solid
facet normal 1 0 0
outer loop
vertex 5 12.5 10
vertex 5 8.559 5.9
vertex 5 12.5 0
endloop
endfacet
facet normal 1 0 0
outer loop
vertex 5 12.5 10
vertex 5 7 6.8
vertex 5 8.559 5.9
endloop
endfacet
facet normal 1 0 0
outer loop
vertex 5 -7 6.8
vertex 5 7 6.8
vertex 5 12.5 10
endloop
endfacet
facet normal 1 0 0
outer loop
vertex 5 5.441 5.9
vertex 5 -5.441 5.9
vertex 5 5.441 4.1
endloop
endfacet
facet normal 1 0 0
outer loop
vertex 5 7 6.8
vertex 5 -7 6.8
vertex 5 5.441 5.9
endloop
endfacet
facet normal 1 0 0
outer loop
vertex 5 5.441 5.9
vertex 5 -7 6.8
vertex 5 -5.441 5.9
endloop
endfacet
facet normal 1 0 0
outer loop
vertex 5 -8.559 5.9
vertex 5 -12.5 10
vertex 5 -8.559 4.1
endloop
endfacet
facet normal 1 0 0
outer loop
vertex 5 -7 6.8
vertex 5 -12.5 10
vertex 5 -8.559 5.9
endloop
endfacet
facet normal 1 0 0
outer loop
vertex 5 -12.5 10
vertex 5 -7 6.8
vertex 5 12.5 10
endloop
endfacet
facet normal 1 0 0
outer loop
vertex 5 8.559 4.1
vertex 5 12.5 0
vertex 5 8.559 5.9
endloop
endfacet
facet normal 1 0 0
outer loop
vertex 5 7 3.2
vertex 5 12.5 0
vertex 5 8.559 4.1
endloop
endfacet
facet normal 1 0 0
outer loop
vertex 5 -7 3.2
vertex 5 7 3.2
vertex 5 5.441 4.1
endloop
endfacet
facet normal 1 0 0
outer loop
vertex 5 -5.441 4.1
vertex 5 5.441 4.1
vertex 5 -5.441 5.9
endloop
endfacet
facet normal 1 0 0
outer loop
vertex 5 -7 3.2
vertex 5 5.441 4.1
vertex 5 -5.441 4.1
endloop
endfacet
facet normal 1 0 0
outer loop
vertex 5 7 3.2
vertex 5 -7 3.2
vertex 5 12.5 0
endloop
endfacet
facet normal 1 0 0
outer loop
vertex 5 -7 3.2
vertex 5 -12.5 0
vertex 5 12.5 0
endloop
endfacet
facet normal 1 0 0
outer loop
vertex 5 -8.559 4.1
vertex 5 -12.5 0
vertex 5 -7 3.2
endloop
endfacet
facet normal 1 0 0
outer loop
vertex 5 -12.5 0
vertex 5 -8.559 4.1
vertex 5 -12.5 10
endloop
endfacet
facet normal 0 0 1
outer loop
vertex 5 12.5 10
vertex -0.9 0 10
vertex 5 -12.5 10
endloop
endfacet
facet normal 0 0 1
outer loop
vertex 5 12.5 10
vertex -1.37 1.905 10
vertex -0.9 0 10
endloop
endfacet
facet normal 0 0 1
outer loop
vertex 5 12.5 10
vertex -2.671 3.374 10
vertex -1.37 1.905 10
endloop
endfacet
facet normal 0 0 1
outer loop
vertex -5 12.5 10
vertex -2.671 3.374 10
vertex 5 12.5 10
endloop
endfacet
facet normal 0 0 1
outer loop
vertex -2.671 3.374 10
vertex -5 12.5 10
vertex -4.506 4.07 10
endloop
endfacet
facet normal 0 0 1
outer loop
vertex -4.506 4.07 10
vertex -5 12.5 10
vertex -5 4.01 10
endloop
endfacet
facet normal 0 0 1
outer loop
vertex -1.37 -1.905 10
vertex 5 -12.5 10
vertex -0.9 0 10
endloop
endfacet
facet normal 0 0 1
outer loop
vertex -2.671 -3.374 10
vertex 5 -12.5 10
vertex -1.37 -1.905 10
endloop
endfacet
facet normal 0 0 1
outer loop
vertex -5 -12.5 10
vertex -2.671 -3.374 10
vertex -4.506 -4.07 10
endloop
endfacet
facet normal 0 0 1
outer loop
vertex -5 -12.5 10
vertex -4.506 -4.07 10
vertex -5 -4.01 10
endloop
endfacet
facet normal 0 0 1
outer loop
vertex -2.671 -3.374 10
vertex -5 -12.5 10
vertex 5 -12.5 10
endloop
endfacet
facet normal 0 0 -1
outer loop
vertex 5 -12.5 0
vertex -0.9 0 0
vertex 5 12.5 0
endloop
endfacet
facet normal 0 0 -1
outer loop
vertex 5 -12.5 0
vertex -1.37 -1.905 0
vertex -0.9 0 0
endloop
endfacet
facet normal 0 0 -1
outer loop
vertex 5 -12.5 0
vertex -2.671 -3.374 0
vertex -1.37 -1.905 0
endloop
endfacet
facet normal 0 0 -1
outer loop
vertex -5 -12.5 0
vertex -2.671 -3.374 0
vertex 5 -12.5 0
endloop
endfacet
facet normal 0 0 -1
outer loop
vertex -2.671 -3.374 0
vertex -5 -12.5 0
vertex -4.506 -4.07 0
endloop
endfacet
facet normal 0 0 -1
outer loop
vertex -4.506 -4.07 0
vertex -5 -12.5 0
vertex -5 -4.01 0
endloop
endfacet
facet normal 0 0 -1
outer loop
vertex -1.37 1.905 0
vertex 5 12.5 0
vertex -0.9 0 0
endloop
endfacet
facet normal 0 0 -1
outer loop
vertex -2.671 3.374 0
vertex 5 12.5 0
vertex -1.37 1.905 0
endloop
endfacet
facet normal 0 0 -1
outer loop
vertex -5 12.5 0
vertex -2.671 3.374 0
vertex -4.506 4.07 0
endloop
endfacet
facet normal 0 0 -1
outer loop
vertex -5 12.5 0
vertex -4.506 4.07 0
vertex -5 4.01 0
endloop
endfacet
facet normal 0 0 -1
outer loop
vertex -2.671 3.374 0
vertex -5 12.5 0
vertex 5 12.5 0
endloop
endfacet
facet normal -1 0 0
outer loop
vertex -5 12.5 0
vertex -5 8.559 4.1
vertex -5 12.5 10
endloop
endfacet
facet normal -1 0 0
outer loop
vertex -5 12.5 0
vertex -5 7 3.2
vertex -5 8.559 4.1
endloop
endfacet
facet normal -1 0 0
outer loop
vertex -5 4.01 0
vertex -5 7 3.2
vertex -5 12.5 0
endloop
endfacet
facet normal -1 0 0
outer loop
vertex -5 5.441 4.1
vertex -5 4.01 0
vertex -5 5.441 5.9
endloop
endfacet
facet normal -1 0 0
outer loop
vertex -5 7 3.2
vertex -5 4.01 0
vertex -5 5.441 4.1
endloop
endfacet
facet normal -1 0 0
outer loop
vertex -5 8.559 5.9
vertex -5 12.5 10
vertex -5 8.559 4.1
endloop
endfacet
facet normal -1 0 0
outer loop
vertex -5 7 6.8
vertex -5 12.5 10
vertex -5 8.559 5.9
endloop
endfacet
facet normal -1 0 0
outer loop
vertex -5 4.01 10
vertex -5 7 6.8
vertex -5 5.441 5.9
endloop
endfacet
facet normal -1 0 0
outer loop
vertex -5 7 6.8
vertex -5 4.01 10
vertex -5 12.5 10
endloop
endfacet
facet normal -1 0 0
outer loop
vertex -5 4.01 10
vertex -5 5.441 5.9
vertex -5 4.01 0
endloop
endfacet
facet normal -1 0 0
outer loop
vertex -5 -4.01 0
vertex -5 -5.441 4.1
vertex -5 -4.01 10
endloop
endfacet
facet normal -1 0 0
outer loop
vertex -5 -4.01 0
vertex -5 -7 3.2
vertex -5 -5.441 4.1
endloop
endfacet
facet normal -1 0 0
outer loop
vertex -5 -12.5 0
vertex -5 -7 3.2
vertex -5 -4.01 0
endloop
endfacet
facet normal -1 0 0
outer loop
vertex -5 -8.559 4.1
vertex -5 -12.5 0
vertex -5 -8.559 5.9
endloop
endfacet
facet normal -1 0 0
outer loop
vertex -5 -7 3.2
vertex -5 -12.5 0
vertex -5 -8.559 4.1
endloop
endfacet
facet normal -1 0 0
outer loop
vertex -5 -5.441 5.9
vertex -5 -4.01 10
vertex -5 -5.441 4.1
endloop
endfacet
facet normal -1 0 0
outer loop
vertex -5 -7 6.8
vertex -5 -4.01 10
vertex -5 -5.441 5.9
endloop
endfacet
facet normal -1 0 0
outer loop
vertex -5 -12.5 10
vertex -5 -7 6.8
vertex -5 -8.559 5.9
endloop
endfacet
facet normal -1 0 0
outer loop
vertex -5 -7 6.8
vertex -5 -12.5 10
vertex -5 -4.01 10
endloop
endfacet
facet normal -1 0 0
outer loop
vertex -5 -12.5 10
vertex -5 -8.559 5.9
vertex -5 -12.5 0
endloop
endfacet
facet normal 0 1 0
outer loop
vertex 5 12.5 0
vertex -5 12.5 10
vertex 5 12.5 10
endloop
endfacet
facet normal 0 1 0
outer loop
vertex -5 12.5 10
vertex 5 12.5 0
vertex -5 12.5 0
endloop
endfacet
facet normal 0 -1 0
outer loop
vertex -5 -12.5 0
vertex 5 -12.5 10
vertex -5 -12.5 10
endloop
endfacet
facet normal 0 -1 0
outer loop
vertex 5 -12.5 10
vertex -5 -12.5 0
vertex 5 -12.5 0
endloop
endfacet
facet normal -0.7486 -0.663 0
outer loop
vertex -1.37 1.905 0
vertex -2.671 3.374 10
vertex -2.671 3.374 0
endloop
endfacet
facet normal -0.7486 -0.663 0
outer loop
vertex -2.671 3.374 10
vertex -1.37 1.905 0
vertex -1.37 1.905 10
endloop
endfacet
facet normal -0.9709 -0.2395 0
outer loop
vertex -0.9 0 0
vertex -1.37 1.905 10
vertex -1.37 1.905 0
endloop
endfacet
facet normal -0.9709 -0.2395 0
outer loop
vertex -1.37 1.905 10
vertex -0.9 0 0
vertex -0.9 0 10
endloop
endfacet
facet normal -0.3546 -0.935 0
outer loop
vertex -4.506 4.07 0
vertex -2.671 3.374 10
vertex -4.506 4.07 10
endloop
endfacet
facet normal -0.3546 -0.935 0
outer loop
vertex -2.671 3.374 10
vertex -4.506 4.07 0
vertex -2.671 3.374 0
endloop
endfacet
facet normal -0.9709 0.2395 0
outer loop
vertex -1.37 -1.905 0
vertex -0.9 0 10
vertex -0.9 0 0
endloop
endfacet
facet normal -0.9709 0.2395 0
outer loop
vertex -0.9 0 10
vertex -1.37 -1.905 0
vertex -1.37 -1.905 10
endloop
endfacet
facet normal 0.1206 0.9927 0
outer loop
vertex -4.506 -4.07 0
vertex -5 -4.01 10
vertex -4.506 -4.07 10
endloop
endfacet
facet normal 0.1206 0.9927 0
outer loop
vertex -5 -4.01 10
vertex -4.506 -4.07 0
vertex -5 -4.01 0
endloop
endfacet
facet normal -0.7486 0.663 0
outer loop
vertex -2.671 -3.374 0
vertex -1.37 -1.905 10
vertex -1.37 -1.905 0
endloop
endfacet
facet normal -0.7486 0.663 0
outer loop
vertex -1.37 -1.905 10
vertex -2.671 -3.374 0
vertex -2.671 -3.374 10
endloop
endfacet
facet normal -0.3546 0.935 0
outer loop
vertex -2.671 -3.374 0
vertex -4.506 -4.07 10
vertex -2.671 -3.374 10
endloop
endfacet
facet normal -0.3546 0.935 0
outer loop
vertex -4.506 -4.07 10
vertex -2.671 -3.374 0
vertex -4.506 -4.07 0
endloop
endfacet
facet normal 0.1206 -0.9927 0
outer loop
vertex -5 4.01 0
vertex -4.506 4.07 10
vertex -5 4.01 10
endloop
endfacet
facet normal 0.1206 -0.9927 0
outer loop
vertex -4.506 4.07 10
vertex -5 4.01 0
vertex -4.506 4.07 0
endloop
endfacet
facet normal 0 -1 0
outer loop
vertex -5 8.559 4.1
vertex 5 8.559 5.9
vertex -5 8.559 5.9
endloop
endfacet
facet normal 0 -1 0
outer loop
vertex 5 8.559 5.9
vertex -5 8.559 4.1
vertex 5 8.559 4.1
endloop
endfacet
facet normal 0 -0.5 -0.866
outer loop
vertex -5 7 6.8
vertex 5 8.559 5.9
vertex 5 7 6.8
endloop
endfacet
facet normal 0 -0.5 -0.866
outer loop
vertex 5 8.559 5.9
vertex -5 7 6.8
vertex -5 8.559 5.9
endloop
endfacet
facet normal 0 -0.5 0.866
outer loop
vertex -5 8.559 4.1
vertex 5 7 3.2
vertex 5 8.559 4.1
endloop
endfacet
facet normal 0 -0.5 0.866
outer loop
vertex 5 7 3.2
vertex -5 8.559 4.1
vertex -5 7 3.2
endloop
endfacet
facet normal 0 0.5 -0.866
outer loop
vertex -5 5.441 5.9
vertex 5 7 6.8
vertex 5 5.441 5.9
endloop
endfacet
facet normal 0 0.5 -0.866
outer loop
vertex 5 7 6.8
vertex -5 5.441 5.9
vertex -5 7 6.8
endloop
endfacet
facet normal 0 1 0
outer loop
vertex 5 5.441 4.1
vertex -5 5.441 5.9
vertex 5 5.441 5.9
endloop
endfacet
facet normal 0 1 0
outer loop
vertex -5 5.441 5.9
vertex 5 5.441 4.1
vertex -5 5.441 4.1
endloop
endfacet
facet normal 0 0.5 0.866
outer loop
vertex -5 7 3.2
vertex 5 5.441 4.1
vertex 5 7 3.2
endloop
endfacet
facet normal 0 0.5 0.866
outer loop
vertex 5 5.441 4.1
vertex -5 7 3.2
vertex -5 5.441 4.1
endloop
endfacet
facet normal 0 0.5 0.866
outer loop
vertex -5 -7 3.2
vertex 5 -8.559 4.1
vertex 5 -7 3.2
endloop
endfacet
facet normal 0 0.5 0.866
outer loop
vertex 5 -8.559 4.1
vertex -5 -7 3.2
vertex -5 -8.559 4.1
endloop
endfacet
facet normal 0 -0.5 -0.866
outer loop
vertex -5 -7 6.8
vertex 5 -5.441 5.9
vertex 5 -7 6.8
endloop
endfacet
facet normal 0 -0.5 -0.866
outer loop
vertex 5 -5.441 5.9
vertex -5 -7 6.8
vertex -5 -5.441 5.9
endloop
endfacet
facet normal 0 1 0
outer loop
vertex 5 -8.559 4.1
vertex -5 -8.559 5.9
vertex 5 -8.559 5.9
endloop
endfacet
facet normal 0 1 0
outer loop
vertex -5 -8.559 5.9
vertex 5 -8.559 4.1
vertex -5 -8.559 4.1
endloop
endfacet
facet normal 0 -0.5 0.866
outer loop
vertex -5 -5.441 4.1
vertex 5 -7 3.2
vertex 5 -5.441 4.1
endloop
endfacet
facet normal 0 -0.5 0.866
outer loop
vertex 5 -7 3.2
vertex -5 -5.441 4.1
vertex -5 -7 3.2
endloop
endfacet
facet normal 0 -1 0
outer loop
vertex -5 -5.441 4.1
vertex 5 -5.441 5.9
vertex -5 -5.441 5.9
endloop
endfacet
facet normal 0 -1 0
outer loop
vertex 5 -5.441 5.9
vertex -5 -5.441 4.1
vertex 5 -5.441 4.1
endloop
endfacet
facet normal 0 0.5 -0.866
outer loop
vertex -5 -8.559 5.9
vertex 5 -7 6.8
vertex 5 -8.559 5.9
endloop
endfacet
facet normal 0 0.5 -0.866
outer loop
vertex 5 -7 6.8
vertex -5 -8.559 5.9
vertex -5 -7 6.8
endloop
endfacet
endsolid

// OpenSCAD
// file: functions.scad
// PRUSA Mendel  
// Functions used in many files
// GNU GPL v3
// Josef Průša
// josefprusa@me.com
// prusadjs.cz
// http://www.reprap.org/wiki/Prusa_Mendel
// http://github.com/prusajr/PrusaMendel


module nut(d,h,horizontal=true){
cornerdiameter =  (d / 2) / cos (180 / 6);
cylinder(h = h, r = cornerdiameter, $fn = 6);
if(horizontal){
for(i = [1:6]){
	rotate([0,0,60*i]) translate([-cornerdiameter-0.2,0,0]) rotate([0,0,-45]) cube(size = [2,2,h]);
}}
}

// Based on nophead research
module polyhole(d,h) {
    n = max(round(2 * d),3);
    rotate([0,0,180])
        cylinder(h = h, r = (d / 2) / cos (180 / n), $fn = n);
}




module roundcorner(diameter){
	difference(){
		cube(size = [diameter,diameter,99], center = false);
		translate(v = [diameter, diameter, 0]) cylinder(h = 100, r=diameter, center=true);
	}
}
// file: metric.scad
// PRUSA Mendel  
// Default metric sizes
// GNU GPL v3
// Josef Průša
// josefprusa@me.com
// prusadjs.cz
// http://www.reprap.org/wiki/Prusa_Mendel
// http://github.com/prusajr/PrusaMendel

// DONT CHANGE THIS FILE! ALTER VALUES IN CONFIGURATION.SCAD INSTEAD

// RODS

threaded_rod_diameter = 8.2;
threaded_rod_diameter_horizontal = 8.2;
smooth_bar_diameter = 8;
smooth_bar_diameter_horizontal = 8.5;

// Nuts and bolts

m8_diameter = 9;
m8_nut_diameter = 14.1;

m4_diameter = 4.5;
m4_nut_diameter = 9;

m3_diameter = 3.6;
m3_nut_diameter = 5.3;
m3_nut_diameter_horizontal = 6.1;

// Bushing holder

bushing_core_diameter = smooth_bar_diameter;
bushing_material_thickness = 1;

// Motors

motor_shaft = 5.5;
// file: configuration.scad
// PRUSA Mendel  
// Configuration file
// GNU GPL v3
// Josef Průša
// josefprusa@me.com
// prusadjs.cz
// http://www.reprap.org/wiki/Prusa_Mendel
// http://github.com/prusajr/PrusaMendel

// PLEASE SELECT ONE OF THE CONFIGURATIONS BELOW
// BY UN-COMMENTING IT

// Uncomment for metric settings
// METRIC METRIC METRIC METRIC METRIC METRIC METRIC METRIC 

include <metric.scad>;

// CUSTOM CUSTOM CUSTOM CUSTOM CUSTOM CUSTOM CUSTOM CUSTOM CUSTOM

thin_wall = 3;

// LM8UU
linear = true;


// CHANGE ONLY THE STUFF YOU KNOW
// IT WILL REPLACE DEFAULT SETTING

// RODS

// threaded_rod_diameter = 0;
// threaded_rod_diameter_horizontal = 0;
// smooth_bar_díameter = 0;
// smooth_bar_díameter_horizontal = 0;

// Nuts and bolts

// m8_diameter = 0;
// m8_nut_diameter = 0;

// m4_diameter = 0;
// m4_nut_diameter = 0;

// m3_diameter = 0;
// m3_nut_diameter = 0;

// Bushing holder

// bushing_core_diameter = smooth_bar_díameter;
// bushing_material_thickness = 0;


///counted stuff
m3_nut_diameter_bigger = ((m3_nut_diameter  / 2) / cos (180 / 6))*2;

// functions 
include <functions.scad>
// main file
// PRUSA Mendel  
// Rod clamp
// GNU GPL v3
// Josef Průša
// josefprusa@me.com
// prusadjs.cz
// http://www.reprap.org/wiki/Prusa_Mendel
// http://github.com/prusajr/PrusaMendel


include <configuration.scad>

/**
 * @id rod-clamp
 * @name Rod clamp
 * @category Printed
 */

module rodclamp(){ 
translate([0,0,5]) difference(){
cube([10,25,10],center=true);
translate([-5,0,0]) cylinder(r=4.1,h=20,center=true);
translate([0,7,0]) rotate([0,90,0]) cylinder(r=m3_diameter/2,h=20,center=true);translate([0,-7,0]) rotate([0,90,0]) cylinder(r=m3_diameter/2,h=20,center=true);}
}

rodclamp();
//cube([100,100,0.01],center=true);
